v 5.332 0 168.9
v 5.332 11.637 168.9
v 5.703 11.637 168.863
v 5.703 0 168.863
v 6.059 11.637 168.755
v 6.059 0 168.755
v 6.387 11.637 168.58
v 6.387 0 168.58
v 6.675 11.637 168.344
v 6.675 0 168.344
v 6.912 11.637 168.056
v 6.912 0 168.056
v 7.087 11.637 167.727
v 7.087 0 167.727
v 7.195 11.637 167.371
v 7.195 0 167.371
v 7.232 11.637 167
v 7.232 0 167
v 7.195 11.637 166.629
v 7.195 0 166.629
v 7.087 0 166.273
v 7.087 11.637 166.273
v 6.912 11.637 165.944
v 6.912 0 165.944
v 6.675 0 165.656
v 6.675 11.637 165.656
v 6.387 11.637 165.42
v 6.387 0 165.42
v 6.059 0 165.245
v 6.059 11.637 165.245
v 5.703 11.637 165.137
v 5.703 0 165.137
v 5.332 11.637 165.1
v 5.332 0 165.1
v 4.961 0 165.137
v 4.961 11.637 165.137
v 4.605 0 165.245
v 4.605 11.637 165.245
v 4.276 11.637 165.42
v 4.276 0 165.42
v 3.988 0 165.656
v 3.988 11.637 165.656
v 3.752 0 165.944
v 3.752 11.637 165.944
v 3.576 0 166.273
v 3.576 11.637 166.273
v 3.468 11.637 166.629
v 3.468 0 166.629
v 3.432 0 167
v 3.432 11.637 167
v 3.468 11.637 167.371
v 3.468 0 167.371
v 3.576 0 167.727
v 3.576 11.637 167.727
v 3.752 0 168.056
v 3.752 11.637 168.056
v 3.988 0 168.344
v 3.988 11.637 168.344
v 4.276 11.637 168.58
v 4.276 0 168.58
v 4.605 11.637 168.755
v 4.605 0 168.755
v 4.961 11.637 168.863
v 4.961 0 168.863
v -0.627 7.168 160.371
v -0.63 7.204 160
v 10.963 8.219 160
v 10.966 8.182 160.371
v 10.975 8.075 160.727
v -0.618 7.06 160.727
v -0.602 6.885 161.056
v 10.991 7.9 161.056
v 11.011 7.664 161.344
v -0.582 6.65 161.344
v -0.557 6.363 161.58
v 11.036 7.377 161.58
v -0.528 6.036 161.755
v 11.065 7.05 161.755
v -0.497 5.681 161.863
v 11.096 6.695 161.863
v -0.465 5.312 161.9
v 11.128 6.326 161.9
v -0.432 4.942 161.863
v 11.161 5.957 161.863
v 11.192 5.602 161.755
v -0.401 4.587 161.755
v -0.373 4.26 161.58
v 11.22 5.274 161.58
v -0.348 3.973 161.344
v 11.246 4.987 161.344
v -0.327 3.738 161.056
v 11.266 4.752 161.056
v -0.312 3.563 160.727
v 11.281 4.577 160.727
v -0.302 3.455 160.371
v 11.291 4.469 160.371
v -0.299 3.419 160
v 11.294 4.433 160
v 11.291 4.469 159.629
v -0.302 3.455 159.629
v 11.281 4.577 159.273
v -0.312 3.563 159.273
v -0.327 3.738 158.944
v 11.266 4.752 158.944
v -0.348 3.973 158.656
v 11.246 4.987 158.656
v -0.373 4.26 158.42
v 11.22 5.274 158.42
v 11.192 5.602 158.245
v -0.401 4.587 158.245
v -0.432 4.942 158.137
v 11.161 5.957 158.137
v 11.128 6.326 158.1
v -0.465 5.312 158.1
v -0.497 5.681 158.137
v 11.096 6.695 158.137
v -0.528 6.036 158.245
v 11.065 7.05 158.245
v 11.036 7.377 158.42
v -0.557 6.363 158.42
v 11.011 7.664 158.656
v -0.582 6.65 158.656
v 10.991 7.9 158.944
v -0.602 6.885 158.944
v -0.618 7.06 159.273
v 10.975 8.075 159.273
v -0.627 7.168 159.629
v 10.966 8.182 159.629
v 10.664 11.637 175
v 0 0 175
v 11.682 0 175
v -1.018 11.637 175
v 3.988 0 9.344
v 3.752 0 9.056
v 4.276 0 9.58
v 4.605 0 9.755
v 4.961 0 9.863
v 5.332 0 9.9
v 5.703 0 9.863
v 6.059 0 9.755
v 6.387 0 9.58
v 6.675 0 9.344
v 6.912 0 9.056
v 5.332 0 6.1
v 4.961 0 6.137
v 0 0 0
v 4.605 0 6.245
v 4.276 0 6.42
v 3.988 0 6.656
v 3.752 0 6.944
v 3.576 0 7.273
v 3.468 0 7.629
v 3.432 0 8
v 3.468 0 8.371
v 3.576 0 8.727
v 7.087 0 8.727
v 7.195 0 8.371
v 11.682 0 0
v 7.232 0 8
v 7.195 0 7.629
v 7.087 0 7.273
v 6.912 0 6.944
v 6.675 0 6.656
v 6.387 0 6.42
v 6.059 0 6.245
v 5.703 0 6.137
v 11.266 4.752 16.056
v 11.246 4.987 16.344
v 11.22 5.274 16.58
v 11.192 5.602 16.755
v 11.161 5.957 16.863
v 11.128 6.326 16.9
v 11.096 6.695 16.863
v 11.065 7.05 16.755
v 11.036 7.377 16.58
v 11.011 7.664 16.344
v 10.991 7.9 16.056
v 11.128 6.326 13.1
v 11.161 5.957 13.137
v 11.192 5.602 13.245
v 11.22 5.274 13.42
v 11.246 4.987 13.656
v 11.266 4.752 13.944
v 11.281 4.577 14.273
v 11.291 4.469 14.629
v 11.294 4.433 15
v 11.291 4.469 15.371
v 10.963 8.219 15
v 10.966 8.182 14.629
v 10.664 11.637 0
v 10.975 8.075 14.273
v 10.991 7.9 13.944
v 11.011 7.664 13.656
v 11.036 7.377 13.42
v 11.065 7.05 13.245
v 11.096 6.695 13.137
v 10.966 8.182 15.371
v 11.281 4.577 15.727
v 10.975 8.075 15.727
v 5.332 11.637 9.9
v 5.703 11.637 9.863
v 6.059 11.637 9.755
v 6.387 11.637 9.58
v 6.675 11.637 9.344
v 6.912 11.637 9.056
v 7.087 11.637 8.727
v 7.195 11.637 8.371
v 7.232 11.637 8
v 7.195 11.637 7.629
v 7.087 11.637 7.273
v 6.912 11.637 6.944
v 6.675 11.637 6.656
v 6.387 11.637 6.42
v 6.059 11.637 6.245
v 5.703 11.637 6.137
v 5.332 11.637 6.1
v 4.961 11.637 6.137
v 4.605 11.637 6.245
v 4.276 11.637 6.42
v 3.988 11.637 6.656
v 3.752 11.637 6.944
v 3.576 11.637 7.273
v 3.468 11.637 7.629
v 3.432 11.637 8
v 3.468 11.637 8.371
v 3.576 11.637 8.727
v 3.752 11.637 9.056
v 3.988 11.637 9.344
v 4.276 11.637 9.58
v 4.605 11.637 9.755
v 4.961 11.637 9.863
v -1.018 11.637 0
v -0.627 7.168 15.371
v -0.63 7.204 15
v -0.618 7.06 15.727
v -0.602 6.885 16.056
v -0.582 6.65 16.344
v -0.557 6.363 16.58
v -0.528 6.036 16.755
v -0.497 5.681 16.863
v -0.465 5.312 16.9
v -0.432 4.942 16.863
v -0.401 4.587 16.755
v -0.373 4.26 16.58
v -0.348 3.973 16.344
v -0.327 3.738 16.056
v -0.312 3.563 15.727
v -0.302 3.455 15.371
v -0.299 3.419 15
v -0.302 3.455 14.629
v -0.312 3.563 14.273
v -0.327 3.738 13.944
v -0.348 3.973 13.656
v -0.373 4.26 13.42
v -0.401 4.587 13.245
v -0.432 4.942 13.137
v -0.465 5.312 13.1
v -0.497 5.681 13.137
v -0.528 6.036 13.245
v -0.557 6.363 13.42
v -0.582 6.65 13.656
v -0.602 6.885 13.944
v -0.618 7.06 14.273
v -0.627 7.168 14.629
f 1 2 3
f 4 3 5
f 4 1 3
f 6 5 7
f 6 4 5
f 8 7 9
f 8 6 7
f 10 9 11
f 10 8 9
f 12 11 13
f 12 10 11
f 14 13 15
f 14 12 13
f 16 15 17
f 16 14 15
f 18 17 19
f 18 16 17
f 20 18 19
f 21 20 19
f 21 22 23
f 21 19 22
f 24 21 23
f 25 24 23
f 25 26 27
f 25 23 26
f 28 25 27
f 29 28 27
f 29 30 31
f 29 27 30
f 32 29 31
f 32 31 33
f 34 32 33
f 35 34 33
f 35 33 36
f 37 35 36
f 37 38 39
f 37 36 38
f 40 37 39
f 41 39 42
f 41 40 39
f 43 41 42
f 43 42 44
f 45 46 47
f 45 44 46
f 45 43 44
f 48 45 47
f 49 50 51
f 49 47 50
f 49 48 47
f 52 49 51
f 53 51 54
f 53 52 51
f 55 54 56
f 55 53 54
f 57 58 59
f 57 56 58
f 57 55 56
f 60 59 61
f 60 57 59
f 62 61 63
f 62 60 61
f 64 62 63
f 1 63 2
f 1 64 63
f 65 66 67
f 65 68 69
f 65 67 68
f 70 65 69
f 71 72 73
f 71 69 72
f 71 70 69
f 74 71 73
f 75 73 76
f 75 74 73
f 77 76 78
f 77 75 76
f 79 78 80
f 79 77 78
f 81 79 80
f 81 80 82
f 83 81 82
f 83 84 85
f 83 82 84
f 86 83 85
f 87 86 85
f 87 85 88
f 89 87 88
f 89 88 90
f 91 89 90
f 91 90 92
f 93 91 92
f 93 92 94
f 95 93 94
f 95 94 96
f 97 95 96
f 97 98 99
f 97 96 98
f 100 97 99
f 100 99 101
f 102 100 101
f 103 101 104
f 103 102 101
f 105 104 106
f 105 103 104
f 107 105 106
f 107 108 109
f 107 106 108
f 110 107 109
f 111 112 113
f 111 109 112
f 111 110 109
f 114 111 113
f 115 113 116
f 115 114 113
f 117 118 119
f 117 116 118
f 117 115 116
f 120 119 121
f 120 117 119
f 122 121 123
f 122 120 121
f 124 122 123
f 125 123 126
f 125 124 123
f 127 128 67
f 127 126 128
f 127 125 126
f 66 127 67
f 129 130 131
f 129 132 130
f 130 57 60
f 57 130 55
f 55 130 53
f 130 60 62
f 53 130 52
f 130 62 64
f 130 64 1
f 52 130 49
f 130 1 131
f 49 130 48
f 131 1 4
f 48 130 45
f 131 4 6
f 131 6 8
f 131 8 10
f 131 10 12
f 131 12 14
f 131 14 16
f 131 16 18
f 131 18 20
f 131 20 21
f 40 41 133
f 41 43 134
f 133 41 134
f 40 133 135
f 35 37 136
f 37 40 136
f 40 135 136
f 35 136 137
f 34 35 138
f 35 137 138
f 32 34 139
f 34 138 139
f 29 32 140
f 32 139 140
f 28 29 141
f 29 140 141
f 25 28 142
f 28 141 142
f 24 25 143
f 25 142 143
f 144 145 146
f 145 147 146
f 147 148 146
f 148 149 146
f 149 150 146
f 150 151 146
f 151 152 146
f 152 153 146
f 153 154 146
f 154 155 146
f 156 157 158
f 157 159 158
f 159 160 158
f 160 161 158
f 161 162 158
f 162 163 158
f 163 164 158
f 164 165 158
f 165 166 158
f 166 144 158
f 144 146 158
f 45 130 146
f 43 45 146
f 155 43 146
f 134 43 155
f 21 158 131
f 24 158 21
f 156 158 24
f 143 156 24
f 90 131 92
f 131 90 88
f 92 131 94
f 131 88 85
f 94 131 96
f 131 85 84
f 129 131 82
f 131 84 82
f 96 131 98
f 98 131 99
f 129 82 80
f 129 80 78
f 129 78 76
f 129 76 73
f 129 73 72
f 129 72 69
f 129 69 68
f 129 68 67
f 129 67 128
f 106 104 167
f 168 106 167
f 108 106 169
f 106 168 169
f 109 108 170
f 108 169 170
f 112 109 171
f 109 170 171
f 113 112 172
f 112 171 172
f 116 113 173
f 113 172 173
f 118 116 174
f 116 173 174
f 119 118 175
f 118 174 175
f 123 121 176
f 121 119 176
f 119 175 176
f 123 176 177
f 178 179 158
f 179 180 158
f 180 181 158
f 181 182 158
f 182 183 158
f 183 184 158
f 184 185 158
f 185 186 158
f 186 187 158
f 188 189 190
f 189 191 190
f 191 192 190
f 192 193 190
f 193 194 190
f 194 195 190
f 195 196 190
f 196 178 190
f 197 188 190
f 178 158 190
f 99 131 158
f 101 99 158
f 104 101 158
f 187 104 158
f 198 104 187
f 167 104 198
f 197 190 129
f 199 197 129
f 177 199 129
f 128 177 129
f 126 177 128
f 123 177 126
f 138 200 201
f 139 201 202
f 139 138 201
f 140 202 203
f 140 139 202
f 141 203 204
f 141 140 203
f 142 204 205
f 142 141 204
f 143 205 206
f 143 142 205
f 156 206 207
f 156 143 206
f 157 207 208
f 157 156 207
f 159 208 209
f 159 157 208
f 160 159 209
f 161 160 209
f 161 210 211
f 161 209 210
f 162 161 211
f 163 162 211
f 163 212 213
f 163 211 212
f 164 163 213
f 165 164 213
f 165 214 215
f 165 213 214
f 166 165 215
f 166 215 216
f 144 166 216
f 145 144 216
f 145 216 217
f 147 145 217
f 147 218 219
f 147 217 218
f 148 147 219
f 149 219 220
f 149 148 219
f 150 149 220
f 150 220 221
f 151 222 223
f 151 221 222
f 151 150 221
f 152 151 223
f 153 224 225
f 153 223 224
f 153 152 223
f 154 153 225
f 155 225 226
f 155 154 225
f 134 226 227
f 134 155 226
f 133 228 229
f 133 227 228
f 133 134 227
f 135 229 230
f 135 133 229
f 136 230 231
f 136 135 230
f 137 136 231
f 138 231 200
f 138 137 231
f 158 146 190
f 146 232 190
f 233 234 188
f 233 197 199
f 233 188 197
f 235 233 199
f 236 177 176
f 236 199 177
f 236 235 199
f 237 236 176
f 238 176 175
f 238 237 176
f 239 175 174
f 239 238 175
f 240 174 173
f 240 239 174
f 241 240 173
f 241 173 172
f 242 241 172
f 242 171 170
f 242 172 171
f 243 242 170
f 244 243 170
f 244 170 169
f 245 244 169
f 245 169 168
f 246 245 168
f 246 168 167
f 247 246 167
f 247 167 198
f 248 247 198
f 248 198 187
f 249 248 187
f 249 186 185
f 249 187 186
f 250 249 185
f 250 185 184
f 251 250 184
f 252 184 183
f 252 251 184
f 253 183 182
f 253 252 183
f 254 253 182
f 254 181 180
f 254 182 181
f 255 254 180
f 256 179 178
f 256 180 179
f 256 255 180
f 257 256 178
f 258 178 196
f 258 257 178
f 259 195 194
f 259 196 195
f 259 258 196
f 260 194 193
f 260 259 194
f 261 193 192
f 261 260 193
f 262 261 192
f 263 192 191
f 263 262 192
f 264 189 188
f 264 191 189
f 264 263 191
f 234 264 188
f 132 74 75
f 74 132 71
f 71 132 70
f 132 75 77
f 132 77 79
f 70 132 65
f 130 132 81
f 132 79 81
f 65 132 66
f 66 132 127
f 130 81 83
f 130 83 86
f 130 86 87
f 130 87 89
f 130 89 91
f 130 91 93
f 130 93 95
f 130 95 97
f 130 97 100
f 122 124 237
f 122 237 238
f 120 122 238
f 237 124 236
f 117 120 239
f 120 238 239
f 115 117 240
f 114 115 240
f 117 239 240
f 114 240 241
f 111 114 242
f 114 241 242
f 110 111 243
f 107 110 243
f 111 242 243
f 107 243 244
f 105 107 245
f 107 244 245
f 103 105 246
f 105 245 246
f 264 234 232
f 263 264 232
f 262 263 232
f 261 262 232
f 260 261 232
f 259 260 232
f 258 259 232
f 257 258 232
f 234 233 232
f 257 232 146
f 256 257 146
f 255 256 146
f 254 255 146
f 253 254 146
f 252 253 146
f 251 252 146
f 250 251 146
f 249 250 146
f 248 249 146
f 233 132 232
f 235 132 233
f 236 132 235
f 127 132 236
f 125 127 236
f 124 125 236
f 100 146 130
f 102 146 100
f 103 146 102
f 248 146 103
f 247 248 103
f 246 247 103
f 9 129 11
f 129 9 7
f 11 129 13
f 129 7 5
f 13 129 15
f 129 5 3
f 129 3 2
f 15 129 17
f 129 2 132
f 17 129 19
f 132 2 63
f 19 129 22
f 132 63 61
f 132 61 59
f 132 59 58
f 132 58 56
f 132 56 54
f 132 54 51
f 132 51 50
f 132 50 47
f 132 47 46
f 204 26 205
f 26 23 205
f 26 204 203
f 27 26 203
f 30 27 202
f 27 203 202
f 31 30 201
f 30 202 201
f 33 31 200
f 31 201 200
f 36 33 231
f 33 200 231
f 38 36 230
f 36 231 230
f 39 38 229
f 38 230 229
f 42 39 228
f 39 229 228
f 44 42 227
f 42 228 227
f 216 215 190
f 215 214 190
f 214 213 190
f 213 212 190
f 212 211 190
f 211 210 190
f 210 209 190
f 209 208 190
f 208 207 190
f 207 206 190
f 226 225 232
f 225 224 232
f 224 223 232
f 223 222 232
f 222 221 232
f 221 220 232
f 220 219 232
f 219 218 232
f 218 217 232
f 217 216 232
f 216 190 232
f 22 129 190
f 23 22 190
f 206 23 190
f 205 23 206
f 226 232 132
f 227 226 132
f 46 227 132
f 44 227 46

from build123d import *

# Parameters (mm, degrees)
BOSS_EXTRUDE1_DEPTH     = 175
SKETCH2_R               = 1.9
CUT_EXTRUDE1_DEPTH      = 176.775126352
CUT_EXTRUDE2_DEPTH      = 176.775126352
CUT_EXTRUDE2_DEPTH_BACK = 176.775126352
SKETCH3_R               = 1.9


with BuildPart() as part:
    # Sketch1 → Boss-Extrude1 (new body)
    with BuildSketch(Plane.XY):
        Polygon((0, 0), (11.68185891, 0), (10.66371782, 11.63740591), (-1.01814109, 11.63740591), align=None)
    extrude(amount=BOSS_EXTRUDE1_DEPTH)

    # Sketch2 → Cut-Extrude1 (cut, through all)
    with BuildSketch(Plane(origin=(0, 0, 0), x_dir=(1, 0, 0), z_dir=(0, 1, 0))):
        with Locations(Location((5.33185891, -8, 0), (0, 0, 270))):
            Circle(SKETCH2_R)
        with Locations(Location((5.33185891, -167, 0), (0, 0, 270))):
            Circle(SKETCH2_R)
    extrude(amount=CUT_EXTRUDE1_DEPTH, mode=Mode.SUBTRACT)

    # Sketch3 → Cut-Extrude2 (cut, two sides: drawn at the far end of the back side and taken through both)
    with BuildSketch(Plane(origin=(11.593122067, 1.014266756, 0), x_dir=(0, 0, -1), z_dir=(0.9961946980917453, 0.08715574274766183, 0)).offset(-CUT_EXTRUDE2_DEPTH_BACK)):
        with Locations(Location((-160, 5.33185891, 0), (0, 0, 90))):
            Circle(SKETCH3_R)
        with Locations(Location((-15, 5.33185891, 0), (0, 0, 90))):
            Circle(SKETCH3_R)
    extrude(amount=CUT_EXTRUDE2_DEPTH + CUT_EXTRUDE2_DEPTH_BACK, mode=Mode.SUBTRACT)


solid = part.part
